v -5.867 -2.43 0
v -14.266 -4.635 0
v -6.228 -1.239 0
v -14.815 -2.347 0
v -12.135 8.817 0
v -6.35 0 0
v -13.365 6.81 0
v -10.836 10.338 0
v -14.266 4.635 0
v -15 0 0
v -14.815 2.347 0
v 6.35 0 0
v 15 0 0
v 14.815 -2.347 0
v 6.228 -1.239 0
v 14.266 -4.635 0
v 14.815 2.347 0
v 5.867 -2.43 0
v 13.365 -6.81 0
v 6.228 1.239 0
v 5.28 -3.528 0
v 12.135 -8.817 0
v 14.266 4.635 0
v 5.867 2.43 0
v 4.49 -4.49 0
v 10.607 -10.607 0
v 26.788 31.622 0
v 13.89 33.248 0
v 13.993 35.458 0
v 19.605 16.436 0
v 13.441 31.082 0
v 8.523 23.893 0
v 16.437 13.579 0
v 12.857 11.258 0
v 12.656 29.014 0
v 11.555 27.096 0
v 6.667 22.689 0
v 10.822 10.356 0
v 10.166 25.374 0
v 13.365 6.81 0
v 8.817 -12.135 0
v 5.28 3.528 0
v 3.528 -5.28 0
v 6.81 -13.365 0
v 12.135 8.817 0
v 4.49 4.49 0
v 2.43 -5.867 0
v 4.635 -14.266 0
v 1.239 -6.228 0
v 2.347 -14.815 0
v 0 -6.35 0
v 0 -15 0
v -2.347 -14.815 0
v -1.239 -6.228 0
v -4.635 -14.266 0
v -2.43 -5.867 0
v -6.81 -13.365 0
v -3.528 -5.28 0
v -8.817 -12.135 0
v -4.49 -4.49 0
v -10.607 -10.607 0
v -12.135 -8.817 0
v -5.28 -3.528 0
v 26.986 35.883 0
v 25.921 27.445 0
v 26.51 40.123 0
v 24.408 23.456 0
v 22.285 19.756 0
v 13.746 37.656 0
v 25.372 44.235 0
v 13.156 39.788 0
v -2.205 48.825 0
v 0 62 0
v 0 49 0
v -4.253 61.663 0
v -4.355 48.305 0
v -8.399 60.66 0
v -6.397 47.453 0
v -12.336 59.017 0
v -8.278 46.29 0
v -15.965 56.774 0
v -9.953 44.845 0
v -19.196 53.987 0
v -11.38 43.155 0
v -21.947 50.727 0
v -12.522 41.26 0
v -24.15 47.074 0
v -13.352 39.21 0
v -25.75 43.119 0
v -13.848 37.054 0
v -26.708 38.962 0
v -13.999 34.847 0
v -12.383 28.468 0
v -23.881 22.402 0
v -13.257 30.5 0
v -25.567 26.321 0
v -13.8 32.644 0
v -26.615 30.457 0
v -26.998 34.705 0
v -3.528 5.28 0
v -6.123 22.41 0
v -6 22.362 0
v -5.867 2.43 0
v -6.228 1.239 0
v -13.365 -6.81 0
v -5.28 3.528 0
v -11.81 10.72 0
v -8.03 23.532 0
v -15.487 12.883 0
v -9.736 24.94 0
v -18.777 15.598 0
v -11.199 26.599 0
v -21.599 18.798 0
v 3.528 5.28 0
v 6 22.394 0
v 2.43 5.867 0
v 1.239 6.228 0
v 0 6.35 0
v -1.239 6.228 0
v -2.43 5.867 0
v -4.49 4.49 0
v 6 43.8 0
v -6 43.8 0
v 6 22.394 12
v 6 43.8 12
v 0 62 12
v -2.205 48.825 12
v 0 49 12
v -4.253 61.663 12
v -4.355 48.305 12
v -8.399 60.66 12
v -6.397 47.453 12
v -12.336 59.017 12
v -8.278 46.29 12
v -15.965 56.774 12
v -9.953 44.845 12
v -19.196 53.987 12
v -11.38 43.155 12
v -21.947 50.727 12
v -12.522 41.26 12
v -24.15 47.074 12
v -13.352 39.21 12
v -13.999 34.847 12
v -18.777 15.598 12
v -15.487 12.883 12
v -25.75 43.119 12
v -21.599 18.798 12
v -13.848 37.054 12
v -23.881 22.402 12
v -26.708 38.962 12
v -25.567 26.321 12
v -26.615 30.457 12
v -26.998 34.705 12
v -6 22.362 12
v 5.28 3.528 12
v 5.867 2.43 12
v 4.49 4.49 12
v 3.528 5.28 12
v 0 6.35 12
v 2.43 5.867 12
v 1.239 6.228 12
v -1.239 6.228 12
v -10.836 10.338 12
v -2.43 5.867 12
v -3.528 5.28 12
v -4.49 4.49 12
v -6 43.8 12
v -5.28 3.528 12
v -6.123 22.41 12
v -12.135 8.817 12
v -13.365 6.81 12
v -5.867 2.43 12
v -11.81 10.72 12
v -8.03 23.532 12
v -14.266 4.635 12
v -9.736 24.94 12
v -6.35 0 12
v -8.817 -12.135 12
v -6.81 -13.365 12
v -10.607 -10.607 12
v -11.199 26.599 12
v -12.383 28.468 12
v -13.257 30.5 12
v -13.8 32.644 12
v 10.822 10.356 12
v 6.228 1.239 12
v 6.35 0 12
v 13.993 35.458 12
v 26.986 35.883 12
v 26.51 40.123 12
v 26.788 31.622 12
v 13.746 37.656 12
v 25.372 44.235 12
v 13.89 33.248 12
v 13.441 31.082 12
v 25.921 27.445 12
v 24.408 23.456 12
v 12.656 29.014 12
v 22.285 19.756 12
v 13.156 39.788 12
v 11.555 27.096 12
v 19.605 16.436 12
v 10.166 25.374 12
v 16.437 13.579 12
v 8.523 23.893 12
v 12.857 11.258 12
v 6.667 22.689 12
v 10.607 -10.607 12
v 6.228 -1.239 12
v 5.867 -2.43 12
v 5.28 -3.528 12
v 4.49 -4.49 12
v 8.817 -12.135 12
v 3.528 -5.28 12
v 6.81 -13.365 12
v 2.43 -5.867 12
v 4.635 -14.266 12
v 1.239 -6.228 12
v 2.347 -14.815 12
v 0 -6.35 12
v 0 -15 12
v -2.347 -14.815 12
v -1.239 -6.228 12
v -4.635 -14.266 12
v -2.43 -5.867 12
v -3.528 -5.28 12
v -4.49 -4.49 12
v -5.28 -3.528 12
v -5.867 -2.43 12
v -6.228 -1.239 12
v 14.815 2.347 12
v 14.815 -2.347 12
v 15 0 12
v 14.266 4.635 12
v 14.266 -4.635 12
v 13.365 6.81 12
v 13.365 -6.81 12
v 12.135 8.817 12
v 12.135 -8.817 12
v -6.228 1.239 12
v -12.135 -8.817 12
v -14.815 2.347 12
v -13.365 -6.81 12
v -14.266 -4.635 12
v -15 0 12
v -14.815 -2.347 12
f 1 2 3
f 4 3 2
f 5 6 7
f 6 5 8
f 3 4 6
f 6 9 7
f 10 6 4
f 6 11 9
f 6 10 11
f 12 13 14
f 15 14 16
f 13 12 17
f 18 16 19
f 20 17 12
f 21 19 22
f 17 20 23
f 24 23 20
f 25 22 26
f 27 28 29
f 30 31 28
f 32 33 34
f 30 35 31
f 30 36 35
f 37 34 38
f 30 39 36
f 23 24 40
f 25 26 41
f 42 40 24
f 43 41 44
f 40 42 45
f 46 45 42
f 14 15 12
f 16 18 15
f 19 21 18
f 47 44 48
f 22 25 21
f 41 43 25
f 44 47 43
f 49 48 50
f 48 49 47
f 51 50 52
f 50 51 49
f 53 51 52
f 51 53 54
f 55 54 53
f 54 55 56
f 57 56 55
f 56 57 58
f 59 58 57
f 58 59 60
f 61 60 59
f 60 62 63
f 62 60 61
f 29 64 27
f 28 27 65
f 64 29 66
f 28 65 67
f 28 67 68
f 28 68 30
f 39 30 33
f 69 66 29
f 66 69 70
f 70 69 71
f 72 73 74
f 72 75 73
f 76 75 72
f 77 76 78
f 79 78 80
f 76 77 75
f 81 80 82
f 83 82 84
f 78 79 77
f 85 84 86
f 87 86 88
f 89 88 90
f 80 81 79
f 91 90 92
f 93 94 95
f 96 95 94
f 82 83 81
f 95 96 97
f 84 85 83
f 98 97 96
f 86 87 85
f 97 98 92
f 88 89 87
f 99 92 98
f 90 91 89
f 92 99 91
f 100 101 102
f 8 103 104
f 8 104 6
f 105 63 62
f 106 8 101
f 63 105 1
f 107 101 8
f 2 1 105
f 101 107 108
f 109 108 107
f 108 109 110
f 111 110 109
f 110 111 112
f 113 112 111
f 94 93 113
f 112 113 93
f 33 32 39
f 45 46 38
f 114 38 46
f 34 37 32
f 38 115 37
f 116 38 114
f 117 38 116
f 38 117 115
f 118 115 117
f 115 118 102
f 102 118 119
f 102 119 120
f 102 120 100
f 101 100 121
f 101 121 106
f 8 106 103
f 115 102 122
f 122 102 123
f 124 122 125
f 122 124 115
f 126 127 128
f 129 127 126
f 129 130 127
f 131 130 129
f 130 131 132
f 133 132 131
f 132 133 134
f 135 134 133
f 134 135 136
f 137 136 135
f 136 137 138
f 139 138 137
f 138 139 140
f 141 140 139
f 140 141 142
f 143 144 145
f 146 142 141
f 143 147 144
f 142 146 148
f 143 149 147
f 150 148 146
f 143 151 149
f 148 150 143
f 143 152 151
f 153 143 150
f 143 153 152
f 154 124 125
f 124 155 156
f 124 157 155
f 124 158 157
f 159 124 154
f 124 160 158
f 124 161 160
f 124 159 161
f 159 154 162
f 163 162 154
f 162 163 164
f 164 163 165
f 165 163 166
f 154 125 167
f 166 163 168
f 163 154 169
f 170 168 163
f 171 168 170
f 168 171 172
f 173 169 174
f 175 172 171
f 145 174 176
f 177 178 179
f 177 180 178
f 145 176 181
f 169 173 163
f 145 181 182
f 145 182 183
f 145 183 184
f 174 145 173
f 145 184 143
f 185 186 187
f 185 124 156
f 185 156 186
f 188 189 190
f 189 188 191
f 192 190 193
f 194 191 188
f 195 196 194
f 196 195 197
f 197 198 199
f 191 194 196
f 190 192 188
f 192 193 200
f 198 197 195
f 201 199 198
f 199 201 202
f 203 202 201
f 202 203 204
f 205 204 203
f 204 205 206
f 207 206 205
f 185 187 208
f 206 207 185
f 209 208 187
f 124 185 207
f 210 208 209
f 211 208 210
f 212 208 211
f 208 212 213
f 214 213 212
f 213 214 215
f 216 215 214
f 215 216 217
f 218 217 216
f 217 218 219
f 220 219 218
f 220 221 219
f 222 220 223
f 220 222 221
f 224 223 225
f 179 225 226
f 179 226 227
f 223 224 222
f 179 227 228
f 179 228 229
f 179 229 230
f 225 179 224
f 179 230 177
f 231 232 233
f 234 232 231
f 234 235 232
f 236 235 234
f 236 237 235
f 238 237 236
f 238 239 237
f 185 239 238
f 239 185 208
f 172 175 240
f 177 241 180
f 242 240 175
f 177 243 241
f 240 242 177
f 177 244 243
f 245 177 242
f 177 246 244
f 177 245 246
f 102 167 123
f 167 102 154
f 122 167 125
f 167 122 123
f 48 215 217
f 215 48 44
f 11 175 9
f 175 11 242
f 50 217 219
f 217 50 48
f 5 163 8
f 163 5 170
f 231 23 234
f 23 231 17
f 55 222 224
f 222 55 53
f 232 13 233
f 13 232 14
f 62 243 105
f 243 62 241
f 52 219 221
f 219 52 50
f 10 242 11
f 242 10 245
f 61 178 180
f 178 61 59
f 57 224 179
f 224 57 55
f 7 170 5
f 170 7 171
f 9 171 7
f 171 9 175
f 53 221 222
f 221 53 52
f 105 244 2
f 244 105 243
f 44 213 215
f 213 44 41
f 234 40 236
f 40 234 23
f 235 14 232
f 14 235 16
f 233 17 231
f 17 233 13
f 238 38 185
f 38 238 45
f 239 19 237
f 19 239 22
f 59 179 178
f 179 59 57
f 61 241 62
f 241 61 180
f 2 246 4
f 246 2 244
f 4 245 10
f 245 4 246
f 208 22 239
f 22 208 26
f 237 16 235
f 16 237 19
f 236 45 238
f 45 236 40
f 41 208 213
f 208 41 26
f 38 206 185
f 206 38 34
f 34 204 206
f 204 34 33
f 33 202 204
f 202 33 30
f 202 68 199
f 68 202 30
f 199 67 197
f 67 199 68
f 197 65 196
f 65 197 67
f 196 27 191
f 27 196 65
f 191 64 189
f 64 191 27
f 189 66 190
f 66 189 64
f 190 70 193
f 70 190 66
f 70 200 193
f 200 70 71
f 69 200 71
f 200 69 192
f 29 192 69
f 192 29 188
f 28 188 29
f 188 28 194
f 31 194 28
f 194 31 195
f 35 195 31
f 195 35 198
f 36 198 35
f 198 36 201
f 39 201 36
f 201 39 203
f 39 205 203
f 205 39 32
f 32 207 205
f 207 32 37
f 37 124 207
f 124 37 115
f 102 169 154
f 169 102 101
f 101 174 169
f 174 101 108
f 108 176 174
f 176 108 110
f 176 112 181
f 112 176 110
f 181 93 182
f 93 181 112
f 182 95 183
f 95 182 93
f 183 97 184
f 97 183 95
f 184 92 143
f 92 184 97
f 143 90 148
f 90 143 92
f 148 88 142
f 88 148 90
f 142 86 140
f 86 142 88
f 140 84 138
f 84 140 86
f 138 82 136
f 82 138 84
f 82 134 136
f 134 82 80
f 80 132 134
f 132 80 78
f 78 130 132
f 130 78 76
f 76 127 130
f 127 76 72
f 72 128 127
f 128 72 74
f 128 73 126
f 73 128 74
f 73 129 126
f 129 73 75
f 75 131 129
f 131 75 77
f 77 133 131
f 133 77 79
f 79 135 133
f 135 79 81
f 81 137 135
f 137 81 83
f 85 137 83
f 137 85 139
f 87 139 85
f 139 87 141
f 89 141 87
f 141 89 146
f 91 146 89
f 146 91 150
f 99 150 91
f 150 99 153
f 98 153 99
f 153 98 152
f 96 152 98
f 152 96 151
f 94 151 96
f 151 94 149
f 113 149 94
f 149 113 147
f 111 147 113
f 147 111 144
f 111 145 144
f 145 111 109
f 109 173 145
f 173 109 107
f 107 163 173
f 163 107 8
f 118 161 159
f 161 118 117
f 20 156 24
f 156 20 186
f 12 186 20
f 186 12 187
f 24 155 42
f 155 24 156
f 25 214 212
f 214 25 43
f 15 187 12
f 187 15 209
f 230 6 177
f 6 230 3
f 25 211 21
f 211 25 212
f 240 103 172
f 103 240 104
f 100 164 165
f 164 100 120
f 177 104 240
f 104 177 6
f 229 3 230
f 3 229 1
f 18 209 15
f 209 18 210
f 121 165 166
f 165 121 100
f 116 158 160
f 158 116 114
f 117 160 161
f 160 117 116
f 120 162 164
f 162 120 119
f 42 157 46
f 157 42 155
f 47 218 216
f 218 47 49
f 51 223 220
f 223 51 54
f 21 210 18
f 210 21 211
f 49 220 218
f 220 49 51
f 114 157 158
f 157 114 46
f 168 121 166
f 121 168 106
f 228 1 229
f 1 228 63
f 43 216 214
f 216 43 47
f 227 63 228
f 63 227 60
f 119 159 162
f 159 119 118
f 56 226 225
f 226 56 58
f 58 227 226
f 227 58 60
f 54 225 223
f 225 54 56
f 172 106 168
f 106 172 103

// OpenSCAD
$fn = 32;

// ----------------------------------------------------------------------
// Hook: 70 mm shank into a 14 mm curl, 12 mm thick
// ----------------------------------------------------------------------

// --- parameters (mm) ---
shank_len = 70;           // shank length from the boss centre
shank_w = 12;             // shank width
boss_d = 30;              // boss diameter
bore_d = 12.7;            // boss bore
curl_in = 14;             // curl inner radius
curl_out = 27;            // curl outer radius
curl_sweep = 290;         // curl sweep angle
hook_t = 12;              // hook thickness

shank_profile = [[-6, 43.8], [6, 43.8], [6, 13], [-6, 13]];
boss_profile = [[15, 0], [14.815, 2.347], [14.266, 4.635], [13.365, 6.81], [12.135, 8.817], [10.607, 10.607], [8.817, 12.135], [6.81, 13.365], [4.635, 14.266], [2.347, 14.815], [0, 15], [-2.347, 14.815], [-4.635, 14.266], [-6.81, 13.365], [-8.817, 12.135], [-10.607, 10.607], [-12.135, 8.817], [-13.365, 6.81], [-14.266, 4.635], [-14.815, 2.347], [-15, 0], [-14.815, -2.347], [-14.266, -4.635], [-13.365, -6.81], [-12.135, -8.817], [-10.607, -10.607], [-8.817, -12.135], [-6.81, -13.365], [-4.635, -14.266], [-2.347, -14.815], [0, -15], [2.347, -14.815], [4.635, -14.266], [6.81, -13.365], [8.817, -12.135], [10.607, -10.607], [12.135, -8.817], [13.365, -6.81], [14.266, -4.635], [14.815, -2.347]];
curl_profile = [[0, 62], [-4.253, 61.663], [-8.399, 60.66], [-12.336, 59.017], [-15.965, 56.774], [-19.196, 53.987], [-21.947, 50.727], [-24.15, 47.074], [-25.75, 43.119], [-26.708, 38.962], [-26.998, 34.705], [-26.615, 30.457], [-25.567, 26.321], [-23.881, 22.402], [-21.599, 18.798], [-18.777, 15.598], [-15.487, 12.883], [-11.81, 10.72], [-7.838, 9.163], [-3.67, 8.251], [0.589, 8.006], [4.833, 8.436], [8.957, 9.529], [12.857, 11.258], [16.437, 13.579], [19.605, 16.436], [22.285, 19.756], [24.408, 23.456], [25.921, 27.445], [26.788, 31.622], [26.986, 35.883], [26.51, 40.123], [25.372, 44.235], [13.156, 39.788], [13.746, 37.656], [13.993, 35.458], [13.89, 33.248], [13.441, 31.082], [12.656, 29.014], [11.555, 27.096], [10.166, 25.374], [8.523, 23.893], [6.667, 22.689], [4.644, 21.793], [2.506, 21.226], [0.305, 21.003], [-1.903, 21.13], [-4.064, 21.603], [-6.123, 22.41], [-8.03, 23.532], [-9.736, 24.94], [-11.199, 26.599], [-12.383, 28.468], [-13.257, 30.5], [-13.8, 32.644], [-13.999, 34.847], [-13.848, 37.054], [-13.352, 39.21], [-12.522, 41.26], [-11.38, 43.155], [-9.953, 44.845], [-8.278, 46.29], [-6.397, 47.453], [-4.355, 48.305], [-2.205, 48.825], [0, 49]];

difference() {
  union() {
    /* three overlapping outlines: shank, boss and the smooth curl */
    linear_extrude(height = hook_t) polygon(shank_profile);
    linear_extrude(height = hook_t) polygon(boss_profile);
    linear_extrude(height = hook_t) polygon(curl_profile);
  }
  translate([0, 0, -2.5]) cylinder(h = hook_t + 5, d = bore_d);
}
